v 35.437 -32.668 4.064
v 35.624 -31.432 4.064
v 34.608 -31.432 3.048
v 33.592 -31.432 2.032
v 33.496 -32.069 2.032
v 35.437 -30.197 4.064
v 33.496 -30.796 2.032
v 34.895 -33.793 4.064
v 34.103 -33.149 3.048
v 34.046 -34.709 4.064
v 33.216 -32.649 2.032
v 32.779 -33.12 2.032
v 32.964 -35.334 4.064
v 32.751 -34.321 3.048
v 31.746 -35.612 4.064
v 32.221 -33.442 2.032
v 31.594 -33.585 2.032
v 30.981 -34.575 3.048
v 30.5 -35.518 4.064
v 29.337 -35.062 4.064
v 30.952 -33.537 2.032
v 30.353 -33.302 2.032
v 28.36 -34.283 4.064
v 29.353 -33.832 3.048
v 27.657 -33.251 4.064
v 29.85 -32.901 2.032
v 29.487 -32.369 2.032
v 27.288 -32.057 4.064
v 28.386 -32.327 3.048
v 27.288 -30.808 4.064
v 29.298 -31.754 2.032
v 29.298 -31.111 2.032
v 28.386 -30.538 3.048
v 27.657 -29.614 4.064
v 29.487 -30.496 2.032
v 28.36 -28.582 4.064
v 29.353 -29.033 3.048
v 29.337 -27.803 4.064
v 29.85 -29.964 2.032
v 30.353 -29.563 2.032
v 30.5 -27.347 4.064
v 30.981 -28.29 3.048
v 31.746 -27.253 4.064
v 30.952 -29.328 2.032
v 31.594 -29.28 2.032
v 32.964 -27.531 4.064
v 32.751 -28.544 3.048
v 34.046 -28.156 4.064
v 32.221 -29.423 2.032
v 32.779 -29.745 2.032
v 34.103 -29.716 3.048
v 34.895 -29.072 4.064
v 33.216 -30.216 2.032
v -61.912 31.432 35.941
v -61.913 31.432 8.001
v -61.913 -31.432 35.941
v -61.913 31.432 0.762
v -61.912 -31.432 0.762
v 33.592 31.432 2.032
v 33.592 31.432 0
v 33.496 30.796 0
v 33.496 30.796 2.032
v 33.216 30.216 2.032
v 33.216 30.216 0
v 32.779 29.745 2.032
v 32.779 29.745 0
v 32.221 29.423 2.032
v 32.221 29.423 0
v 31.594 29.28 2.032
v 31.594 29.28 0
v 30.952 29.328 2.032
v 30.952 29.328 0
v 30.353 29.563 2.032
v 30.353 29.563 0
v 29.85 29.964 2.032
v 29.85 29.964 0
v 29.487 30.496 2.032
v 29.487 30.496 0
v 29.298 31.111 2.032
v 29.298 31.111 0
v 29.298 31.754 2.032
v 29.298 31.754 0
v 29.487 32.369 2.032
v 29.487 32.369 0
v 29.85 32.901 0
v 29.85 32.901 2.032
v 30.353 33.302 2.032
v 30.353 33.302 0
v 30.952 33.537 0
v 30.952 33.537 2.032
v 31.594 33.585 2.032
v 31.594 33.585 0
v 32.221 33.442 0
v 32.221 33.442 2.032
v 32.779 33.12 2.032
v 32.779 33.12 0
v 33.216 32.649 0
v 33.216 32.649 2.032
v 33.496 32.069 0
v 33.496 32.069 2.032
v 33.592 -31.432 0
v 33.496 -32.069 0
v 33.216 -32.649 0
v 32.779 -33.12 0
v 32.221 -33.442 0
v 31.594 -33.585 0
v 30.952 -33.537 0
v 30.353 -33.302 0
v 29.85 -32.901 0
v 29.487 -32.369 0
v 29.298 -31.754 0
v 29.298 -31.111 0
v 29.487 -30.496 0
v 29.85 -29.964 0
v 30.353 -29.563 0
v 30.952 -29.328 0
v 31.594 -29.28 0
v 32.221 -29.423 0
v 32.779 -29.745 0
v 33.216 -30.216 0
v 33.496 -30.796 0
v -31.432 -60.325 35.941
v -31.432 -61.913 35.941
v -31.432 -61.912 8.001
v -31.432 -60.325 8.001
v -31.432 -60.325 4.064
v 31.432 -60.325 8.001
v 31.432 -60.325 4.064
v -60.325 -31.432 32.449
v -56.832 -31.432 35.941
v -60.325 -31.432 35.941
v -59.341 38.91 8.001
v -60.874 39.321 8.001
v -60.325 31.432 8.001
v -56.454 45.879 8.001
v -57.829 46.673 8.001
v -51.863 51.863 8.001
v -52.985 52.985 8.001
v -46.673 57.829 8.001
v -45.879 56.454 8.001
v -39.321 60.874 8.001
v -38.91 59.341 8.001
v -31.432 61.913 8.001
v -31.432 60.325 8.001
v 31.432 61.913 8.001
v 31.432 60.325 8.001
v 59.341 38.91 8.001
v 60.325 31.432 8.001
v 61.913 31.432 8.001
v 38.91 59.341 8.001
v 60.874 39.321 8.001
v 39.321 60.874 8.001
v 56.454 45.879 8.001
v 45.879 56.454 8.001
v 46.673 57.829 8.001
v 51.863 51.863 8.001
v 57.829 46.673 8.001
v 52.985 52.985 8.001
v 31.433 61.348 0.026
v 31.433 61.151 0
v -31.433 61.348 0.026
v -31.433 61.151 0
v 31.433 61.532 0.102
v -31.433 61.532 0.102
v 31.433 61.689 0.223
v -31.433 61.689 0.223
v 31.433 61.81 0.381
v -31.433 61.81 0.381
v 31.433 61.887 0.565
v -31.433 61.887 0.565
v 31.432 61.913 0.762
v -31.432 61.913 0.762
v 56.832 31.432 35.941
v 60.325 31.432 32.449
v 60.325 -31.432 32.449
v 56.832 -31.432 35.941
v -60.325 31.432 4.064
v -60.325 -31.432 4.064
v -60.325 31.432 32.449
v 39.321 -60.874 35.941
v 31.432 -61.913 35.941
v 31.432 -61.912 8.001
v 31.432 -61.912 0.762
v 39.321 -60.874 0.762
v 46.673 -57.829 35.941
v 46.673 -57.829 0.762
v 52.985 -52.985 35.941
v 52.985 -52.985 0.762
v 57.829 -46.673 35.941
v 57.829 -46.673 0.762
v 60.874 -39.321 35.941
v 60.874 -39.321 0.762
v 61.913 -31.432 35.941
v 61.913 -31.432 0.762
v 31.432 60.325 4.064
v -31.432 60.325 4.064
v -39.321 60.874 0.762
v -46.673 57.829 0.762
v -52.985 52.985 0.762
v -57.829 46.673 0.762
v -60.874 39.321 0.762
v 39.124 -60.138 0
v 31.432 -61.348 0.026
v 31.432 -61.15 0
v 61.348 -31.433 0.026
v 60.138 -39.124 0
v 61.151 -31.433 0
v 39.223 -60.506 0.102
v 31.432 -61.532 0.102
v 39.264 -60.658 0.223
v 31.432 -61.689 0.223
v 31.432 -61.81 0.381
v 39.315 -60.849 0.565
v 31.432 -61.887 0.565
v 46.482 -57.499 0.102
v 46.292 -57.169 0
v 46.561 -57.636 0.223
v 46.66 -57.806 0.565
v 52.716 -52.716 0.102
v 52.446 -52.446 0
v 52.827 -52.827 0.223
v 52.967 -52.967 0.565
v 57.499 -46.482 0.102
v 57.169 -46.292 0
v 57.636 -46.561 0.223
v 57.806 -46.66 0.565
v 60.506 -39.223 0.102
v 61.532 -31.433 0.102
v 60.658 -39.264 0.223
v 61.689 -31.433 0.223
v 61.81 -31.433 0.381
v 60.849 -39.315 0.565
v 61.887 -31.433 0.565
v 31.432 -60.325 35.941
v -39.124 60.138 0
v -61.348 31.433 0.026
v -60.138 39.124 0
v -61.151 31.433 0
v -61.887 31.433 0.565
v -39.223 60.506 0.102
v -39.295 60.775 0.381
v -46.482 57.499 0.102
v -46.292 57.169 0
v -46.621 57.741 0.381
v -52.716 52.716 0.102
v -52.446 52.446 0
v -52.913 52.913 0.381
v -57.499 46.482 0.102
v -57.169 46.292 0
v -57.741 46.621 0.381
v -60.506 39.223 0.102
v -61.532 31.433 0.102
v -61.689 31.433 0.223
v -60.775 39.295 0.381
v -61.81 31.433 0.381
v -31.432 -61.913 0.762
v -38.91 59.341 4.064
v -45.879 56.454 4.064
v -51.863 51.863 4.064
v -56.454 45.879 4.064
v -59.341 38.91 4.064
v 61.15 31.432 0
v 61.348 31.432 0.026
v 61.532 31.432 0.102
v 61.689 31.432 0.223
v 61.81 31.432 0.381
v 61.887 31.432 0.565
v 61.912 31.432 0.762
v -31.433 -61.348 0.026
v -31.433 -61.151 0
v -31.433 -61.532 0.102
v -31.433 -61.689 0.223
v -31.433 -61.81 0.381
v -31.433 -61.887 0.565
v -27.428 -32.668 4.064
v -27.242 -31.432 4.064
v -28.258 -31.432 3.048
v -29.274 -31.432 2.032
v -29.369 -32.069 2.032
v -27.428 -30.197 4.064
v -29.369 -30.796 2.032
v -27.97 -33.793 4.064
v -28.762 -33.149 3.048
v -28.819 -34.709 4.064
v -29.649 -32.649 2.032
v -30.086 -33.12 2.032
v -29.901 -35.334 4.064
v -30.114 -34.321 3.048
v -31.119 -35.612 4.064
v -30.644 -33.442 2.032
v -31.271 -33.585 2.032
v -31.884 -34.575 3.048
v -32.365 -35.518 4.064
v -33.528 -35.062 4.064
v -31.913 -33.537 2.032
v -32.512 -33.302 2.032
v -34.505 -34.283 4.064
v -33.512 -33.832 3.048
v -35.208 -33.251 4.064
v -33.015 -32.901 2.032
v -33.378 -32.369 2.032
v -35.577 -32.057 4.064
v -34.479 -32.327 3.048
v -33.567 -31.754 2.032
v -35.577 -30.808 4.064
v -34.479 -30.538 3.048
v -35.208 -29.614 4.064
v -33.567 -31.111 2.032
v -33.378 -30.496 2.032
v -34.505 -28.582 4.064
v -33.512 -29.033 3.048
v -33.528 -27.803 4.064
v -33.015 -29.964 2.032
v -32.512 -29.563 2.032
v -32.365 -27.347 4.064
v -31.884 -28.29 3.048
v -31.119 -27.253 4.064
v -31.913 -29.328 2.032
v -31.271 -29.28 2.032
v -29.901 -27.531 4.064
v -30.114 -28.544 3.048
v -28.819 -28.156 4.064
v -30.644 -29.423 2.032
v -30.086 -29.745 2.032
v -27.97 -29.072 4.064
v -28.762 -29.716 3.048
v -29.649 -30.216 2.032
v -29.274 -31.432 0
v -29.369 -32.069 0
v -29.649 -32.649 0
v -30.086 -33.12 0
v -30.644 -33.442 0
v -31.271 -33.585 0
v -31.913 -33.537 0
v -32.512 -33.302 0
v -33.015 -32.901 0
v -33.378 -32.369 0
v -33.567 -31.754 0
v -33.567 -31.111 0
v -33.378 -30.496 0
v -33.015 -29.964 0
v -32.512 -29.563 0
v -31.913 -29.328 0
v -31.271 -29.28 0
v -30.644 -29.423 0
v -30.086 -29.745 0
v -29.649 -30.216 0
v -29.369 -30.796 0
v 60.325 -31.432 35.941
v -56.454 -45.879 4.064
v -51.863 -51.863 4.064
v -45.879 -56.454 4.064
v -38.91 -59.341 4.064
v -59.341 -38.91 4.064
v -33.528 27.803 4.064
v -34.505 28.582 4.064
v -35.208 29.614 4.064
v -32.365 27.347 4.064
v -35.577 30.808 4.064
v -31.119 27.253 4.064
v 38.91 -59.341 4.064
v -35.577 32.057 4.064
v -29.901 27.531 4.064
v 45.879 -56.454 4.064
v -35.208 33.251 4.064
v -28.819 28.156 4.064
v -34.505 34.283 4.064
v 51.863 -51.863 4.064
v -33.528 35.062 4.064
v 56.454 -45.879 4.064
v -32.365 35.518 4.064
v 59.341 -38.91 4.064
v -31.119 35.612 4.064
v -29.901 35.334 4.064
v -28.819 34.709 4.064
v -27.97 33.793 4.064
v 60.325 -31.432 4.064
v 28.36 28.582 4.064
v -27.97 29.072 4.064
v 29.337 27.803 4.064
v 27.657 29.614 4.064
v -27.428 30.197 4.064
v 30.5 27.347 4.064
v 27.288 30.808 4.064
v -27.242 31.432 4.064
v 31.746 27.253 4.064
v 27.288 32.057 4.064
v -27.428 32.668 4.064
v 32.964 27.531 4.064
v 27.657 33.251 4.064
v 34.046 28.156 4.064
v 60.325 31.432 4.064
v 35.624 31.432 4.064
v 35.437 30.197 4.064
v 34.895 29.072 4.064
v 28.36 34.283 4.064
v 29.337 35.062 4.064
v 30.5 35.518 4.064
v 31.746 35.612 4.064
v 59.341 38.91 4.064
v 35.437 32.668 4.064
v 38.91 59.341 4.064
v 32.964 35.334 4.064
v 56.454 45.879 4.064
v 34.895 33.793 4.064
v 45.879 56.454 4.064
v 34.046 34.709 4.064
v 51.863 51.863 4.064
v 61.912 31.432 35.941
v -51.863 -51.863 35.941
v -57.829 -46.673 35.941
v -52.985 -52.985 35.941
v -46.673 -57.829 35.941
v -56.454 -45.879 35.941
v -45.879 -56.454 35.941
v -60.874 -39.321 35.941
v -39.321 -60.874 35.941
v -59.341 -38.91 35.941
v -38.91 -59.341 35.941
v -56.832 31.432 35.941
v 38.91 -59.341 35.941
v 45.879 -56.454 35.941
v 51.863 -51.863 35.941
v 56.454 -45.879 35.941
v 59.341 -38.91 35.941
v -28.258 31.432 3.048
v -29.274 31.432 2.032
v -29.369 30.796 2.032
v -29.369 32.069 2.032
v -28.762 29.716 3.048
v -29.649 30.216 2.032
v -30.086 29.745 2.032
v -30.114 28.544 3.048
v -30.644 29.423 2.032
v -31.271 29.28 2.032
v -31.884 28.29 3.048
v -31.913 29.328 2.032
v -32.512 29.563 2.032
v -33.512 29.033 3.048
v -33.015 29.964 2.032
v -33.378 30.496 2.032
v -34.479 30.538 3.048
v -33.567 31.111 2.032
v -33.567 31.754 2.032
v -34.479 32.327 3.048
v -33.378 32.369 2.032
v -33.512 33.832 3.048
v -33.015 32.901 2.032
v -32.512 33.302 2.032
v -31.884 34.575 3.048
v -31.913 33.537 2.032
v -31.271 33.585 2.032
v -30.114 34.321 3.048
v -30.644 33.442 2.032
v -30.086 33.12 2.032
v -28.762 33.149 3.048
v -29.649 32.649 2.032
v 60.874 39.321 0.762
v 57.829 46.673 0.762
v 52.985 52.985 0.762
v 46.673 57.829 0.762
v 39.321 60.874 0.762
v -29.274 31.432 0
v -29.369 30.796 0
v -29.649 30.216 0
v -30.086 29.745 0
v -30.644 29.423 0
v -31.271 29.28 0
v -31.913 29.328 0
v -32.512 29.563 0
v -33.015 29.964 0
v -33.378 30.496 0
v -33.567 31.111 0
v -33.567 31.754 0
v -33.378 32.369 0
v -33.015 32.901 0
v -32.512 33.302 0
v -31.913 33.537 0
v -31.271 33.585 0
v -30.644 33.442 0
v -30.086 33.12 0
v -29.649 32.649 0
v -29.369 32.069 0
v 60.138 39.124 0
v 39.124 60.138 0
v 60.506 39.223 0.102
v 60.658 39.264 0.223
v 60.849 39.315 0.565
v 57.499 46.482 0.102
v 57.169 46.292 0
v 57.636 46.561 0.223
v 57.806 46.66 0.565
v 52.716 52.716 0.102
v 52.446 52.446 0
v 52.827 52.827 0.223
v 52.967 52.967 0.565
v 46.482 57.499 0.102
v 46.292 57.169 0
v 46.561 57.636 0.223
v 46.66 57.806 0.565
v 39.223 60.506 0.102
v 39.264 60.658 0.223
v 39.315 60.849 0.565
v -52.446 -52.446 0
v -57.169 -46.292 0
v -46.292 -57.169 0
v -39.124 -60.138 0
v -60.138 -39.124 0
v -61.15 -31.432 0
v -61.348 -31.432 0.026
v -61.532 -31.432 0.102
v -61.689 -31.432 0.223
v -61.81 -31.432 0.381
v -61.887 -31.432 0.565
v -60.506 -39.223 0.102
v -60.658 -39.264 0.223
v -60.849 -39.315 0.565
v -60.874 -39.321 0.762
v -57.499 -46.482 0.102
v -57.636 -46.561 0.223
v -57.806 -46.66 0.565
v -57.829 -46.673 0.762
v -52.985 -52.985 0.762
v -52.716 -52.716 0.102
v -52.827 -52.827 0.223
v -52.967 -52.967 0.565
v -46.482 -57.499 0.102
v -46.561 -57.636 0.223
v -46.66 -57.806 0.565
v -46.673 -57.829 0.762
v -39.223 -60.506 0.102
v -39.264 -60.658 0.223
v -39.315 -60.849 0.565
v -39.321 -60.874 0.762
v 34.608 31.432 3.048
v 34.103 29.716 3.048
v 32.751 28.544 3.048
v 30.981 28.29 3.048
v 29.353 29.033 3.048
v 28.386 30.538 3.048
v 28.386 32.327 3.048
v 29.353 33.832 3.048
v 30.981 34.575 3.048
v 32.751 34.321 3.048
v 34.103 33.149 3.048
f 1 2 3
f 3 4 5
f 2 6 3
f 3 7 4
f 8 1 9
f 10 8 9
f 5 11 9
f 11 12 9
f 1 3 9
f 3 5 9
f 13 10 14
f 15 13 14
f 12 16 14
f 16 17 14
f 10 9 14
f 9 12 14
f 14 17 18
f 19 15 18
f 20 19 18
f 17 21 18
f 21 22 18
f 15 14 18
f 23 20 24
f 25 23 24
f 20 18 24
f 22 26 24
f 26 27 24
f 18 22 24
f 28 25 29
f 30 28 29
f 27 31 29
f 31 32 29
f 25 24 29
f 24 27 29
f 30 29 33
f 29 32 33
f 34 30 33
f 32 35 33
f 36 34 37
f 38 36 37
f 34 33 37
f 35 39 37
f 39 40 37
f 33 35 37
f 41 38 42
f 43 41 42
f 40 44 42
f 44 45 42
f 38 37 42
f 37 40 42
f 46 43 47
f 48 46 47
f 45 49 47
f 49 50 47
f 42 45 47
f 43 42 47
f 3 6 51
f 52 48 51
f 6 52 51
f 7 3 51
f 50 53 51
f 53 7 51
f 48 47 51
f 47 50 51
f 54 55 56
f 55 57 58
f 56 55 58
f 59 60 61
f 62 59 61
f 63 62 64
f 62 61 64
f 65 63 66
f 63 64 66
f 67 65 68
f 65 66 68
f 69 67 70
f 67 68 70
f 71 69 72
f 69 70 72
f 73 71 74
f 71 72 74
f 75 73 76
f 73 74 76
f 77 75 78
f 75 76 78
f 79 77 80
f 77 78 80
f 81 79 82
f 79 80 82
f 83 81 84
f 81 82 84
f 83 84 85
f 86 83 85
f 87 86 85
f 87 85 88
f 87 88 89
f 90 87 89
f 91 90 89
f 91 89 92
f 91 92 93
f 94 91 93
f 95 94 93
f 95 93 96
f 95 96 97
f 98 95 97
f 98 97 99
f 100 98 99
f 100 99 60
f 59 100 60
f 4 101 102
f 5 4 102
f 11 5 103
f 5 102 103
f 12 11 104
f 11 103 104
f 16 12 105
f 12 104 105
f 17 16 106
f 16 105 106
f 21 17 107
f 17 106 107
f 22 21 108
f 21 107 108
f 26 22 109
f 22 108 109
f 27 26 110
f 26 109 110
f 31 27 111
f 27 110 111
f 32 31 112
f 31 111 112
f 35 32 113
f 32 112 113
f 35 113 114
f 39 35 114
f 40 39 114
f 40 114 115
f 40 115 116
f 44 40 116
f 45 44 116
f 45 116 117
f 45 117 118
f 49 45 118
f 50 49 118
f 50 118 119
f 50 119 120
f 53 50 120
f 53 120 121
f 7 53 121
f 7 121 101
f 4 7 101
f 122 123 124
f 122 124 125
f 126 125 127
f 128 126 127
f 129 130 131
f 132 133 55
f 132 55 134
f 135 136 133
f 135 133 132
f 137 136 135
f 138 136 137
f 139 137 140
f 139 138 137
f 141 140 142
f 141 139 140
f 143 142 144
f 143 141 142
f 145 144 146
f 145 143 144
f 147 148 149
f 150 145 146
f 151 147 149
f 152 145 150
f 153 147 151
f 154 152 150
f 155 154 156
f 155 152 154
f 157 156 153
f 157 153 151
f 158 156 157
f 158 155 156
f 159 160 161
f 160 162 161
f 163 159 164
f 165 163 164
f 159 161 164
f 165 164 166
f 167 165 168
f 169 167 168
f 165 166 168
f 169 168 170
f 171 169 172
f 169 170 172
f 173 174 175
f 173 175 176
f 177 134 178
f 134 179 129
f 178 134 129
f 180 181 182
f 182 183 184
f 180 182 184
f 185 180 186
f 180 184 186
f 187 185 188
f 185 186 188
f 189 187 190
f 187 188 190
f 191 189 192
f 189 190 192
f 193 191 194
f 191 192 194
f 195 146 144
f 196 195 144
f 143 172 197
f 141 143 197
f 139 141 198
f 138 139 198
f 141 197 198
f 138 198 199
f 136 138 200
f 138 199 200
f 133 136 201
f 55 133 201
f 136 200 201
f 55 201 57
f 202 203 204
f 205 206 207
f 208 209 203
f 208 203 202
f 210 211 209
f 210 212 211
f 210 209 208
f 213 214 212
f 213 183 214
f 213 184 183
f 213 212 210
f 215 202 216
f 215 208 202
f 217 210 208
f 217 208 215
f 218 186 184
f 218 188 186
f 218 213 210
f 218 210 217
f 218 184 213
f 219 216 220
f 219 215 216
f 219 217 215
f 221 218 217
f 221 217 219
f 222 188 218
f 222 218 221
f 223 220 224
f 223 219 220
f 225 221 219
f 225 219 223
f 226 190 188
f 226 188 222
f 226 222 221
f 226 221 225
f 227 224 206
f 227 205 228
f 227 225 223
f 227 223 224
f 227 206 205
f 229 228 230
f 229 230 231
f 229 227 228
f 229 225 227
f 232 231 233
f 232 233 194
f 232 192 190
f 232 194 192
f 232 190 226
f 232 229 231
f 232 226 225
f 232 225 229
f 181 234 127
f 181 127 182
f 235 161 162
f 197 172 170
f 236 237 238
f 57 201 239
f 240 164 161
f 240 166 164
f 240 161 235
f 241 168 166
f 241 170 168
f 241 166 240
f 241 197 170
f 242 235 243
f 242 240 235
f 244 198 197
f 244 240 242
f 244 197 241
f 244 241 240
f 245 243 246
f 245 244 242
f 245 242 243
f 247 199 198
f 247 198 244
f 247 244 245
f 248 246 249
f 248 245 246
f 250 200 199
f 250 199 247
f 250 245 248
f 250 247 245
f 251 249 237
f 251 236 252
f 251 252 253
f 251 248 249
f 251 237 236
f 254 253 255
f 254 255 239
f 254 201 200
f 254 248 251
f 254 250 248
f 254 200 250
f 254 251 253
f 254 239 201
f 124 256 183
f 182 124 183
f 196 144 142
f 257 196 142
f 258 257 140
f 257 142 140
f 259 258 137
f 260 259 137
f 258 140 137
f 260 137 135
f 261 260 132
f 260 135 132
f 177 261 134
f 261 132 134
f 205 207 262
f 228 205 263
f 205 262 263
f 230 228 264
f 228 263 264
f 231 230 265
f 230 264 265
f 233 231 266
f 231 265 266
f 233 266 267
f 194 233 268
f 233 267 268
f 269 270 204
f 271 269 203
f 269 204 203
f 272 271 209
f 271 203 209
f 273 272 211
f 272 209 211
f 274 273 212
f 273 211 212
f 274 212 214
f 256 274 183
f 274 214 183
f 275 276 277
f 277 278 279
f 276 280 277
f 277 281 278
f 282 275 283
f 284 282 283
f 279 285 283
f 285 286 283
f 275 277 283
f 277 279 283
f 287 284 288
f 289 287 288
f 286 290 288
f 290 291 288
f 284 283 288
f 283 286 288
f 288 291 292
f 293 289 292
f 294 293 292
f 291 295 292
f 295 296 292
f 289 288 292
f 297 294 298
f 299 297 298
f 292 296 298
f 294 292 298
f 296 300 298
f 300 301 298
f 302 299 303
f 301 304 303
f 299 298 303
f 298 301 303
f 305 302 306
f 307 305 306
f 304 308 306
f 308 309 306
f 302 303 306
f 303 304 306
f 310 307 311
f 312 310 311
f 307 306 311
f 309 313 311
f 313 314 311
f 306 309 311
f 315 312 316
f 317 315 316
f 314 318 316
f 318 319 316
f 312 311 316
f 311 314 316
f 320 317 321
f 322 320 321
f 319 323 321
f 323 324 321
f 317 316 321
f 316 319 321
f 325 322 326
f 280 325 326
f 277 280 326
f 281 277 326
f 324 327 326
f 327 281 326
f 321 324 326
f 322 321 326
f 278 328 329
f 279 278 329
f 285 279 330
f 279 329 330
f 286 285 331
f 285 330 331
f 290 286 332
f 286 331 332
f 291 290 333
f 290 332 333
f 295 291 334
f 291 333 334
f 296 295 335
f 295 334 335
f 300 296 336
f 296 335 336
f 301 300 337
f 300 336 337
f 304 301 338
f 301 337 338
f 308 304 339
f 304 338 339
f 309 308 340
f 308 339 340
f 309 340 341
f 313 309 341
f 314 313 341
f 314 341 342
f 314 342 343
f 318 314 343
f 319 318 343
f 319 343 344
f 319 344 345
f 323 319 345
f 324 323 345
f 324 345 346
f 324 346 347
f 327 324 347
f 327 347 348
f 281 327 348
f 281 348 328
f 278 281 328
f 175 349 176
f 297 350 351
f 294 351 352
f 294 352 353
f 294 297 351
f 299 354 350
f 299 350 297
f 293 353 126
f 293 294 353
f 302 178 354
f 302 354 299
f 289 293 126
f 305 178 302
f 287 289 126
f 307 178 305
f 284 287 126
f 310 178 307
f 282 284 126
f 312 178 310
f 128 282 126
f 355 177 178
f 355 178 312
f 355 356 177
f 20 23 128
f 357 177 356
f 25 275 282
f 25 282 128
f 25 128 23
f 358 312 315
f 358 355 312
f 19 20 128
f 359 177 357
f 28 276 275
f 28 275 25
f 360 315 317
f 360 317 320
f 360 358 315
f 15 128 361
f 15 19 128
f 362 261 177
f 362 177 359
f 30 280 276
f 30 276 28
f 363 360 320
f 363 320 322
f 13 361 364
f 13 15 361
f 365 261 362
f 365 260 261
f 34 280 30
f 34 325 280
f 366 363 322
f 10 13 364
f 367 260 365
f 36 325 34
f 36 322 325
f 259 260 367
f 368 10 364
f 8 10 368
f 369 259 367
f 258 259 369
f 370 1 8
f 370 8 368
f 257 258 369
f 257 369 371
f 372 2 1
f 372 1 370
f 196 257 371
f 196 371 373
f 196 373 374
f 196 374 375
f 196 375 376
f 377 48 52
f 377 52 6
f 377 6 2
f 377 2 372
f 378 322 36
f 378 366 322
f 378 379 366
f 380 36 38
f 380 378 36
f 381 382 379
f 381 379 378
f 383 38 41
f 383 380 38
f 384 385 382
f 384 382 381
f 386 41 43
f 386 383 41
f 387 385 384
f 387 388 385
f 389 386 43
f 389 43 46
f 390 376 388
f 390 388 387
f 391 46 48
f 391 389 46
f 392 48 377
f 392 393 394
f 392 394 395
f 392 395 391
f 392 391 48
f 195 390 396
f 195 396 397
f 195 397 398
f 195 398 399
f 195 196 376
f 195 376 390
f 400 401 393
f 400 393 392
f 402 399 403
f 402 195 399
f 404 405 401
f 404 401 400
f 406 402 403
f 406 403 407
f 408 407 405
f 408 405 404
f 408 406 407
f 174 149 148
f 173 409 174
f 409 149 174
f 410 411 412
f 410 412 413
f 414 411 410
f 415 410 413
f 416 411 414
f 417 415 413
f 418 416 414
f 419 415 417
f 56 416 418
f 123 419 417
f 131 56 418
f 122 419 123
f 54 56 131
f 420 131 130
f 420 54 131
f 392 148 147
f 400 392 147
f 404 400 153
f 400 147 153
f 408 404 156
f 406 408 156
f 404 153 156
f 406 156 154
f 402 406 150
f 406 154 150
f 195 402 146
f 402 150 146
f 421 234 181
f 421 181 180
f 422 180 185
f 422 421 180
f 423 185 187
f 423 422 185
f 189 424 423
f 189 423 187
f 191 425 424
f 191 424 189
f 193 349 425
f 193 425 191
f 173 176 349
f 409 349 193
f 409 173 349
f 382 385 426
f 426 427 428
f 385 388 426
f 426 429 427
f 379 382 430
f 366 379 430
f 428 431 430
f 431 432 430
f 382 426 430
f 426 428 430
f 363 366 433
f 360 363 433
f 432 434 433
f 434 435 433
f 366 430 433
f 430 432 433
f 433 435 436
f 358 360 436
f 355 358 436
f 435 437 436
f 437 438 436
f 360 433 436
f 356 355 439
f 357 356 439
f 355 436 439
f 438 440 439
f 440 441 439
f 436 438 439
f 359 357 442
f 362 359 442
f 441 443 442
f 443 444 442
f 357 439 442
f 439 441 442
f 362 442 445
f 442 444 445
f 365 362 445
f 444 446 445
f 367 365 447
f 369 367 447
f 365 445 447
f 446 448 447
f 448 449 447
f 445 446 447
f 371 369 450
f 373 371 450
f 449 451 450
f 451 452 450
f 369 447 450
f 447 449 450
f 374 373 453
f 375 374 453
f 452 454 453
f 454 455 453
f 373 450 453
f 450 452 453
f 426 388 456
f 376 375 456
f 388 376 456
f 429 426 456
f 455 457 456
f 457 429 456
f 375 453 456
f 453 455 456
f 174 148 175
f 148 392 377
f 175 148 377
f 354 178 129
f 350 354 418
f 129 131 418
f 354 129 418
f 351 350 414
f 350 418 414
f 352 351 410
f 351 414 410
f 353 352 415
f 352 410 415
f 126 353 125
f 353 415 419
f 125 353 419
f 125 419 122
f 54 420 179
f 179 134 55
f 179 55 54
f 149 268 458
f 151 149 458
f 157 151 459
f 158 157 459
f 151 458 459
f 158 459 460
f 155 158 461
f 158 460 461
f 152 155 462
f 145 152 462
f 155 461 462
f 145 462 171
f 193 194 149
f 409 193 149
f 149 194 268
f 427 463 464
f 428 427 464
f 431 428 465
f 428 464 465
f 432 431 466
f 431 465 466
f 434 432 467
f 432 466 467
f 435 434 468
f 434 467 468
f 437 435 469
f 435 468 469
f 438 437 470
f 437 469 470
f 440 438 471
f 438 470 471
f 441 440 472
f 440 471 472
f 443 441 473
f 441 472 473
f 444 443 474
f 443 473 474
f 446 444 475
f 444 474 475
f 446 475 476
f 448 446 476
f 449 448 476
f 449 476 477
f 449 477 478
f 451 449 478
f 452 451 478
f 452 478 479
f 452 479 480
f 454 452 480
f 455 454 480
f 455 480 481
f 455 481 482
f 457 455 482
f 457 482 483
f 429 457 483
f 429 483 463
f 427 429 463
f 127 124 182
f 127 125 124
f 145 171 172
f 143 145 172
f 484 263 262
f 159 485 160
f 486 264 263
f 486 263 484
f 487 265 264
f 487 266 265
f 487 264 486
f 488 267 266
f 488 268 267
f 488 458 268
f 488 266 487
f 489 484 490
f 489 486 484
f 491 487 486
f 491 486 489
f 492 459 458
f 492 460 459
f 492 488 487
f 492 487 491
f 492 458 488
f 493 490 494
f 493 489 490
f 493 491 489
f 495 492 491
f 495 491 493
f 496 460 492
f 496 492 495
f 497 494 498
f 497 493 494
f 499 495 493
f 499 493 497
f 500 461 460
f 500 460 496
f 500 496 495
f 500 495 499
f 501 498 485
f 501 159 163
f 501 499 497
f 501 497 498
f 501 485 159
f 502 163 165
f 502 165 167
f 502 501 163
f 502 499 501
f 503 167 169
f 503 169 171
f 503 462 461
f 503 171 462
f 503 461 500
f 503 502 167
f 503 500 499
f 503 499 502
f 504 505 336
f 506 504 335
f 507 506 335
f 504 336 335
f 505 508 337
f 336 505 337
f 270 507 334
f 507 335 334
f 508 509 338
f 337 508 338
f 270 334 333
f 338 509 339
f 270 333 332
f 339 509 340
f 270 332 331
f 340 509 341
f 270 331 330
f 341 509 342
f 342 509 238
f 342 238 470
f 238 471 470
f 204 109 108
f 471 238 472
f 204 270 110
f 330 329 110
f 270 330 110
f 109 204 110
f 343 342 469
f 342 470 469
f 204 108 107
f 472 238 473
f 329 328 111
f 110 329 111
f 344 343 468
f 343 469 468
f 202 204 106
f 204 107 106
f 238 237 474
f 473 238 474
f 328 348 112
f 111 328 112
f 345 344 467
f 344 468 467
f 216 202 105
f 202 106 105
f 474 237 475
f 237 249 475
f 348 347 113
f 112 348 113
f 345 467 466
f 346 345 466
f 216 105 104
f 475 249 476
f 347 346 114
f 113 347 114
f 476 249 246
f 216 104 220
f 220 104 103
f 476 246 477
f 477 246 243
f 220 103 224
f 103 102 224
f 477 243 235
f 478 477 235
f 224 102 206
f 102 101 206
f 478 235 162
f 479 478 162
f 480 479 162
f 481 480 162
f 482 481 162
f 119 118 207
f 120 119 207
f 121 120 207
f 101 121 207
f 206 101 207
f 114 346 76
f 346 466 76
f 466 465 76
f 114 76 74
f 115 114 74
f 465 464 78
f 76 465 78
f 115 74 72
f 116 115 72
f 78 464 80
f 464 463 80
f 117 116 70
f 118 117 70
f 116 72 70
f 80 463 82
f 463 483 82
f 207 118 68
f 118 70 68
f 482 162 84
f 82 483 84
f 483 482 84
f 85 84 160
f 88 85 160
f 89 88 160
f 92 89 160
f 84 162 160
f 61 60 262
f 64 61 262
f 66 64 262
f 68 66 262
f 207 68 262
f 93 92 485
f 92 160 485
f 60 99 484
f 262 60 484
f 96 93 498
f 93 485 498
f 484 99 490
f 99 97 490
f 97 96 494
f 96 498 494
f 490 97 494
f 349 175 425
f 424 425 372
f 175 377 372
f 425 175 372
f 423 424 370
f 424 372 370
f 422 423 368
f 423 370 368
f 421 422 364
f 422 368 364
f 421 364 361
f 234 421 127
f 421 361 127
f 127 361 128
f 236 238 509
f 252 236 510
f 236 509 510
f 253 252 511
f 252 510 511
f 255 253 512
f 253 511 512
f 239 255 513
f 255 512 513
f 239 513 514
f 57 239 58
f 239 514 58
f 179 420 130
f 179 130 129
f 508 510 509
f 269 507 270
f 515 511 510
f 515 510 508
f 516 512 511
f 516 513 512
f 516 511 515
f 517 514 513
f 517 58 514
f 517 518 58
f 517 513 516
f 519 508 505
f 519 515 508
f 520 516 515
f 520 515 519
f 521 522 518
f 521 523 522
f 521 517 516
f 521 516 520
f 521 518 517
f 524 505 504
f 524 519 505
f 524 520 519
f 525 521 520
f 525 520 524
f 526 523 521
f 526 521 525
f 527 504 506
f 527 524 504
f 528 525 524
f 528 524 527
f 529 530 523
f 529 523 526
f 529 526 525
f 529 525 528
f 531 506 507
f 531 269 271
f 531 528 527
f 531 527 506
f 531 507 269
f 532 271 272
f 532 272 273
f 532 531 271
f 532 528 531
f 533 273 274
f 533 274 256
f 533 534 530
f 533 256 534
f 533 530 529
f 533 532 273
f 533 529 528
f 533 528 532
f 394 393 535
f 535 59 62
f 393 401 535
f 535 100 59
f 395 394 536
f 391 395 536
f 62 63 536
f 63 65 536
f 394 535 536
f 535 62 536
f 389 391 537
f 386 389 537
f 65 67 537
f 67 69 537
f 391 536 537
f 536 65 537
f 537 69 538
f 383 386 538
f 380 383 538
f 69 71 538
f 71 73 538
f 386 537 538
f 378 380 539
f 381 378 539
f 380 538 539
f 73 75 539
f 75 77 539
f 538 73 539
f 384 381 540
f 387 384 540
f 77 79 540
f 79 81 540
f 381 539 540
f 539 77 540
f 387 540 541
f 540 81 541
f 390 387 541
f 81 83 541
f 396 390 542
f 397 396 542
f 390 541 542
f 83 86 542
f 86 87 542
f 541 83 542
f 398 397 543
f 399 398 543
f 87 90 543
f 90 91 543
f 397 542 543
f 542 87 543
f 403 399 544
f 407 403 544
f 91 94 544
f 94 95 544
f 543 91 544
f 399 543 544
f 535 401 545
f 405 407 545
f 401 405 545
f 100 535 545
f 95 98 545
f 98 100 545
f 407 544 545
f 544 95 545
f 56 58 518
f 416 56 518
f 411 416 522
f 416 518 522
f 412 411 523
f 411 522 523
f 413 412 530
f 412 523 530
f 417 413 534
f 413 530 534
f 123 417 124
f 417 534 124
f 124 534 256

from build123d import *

# Parameters (mm, degrees)
F1_DEPTH = 8.001
F3_DEPTH = 3.937
F5_DEPTH = 27.94
F7_DEPTH = 62.865
F8_R     = 2.159
F9_DEPTH = 25.4
F10_SIZE = 2.032
F11_R    = 0.762


with BuildPart() as f1:
    # F0 (on Top) → F1 (new body)
    with BuildSketch(Plane.XY):
        with BuildLine():
            Line((31.4325, 61.9125), (-31.4325, 61.9125))
            ThreePointArc((-31.4325, 61.9125), (-52.9851146906, 52.9851146906), (-61.9125, 31.4325))
            Line((-61.9125, 31.4325), (-61.9125, -31.4325))
            ThreePointArc((-61.9125, -31.4325), (-52.9851146906, -52.9851146906), (-31.4325, -61.9125))
            Line((-31.4325, -61.9125), (31.4325, -61.9125))
            ThreePointArc((31.4325, -61.9125), (52.9851146906, -52.9851146906), (61.9125, -31.4325))
            Line((61.9125, -31.4325), (61.9125, 31.4325))
            ThreePointArc((61.9125, 31.4325), (52.9851146906, 52.9851146906), (31.4325, 61.9125))
        make_face()
    extrude(amount=F1_DEPTH)

    # F2 (on face) → F3 (cut)
    with BuildSketch(Plane.XY.offset(8.001)):
        with BuildLine():
            Line((31.4325, 60.325), (-31.4325, 60.325))
            ThreePointArc((-31.4325, 60.325), (-51.8625826754, 51.8625826754), (-60.325, 31.4325))
            Line((-60.325, 31.4325), (-60.325, -31.4325))
            ThreePointArc((-60.325, -31.4325), (-51.8625826754, -51.8625826754), (-31.4325, -60.325))
            Line((-31.4325, -60.325), (31.4325, -60.325))
            ThreePointArc((31.4325, -60.325), (51.8625826754, -51.8625826754), (60.325, -31.4325))
            Line((60.325, -31.4325), (60.325, 31.4325))
            ThreePointArc((60.325, 31.4325), (51.8625826754, 51.8625826754), (31.4325, 60.325))
        make_face()
    extrude(amount=-F3_DEPTH, mode=Mode.SUBTRACT)

    # F4 (on face) → F5 (join)
    with BuildSketch(Plane.XY.offset(8.001)):
        with BuildLine():
            Line((61.9125, 31.4325), (60.325, 31.4325))
            Line((60.325, 31.4325), (60.325, -31.4325))
            ThreePointArc((60.325, -31.4325), (51.8625826754, -51.8625826754), (31.4325, -60.325))
            Line((31.4325, -60.325), (31.4325, -61.9125))
            ThreePointArc((31.4325, -61.9125), (52.9851146906, -52.9851146906), (61.9125, -31.4325))
            Line((61.9125, -31.4325), (61.9125, 31.4325))
        make_face()
        with BuildLine():
            Line((-60.325, -31.4325), (-60.325, 31.4325))
            Line((-60.325, 31.4325), (-61.9125, 31.4325))
            Line((-61.9125, 31.4325), (-61.9125, -31.4325))
            ThreePointArc((-61.9125, -31.4325), (-52.9851146906, -52.9851146906), (-31.4325, -61.9125))
            Line((-31.4325, -61.9125), (-31.4325, -60.325))
            ThreePointArc((-31.4325, -60.325), (-51.8625826754, -51.8625826754), (-60.325, -31.4325))
        make_face()
    extrude(amount=F5_DEPTH)

    # F6 (on face) → F7 (join, through all)
    with BuildSketch(Plane(origin=(0, 31.4325, 0), x_dir=(-1, 0, 0), z_dir=(0, 1, 0))):
        Polygon((-56.8325, 35.941), (-60.325, 35.941), (-60.325, 32.4485), align=None)
        Polygon((60.325, 32.4485), (60.325, 35.941), (56.8325, 35.941), align=None)
    extrude(amount=-F7_DEPTH)

    # F8 (on face) → F9 (cut)
    with BuildSketch(Plane(origin=(0, 0, 0), x_dir=(1, 0, 0), z_dir=(0, 0, -1))):
        with Locations((-31.4325, 31.4325)):
            Circle(F8_R)
        with Locations((31.4325, 31.4325)):
            Circle(F8_R)
        with Locations((31.4325, -31.4325)):
            Circle(F8_R)
        with Locations((-31.4325, -31.4325)):
            Circle(F8_R)
    extrude(amount=-F9_DEPTH, mode=Mode.SUBTRACT)

    # F10
    f10_edges = [f1.edges().sort_by_distance(p)[0] for p in [
        (29.2735, -31.4325, 4.064),
        (-33.5915, -31.4325, 4.064),
        (-33.5915, 31.4325, 4.064),
        (29.2735, 31.4325, 4.064),
    ]]
    chamfer(f10_edges, length=F10_SIZE)

    # F11
    f11_edges = [f1.edges().sort_by_distance(p)[0] for p in [
        (-52.985115, 52.985115, 0),
    ]]
    fillet(f11_edges, radius=F11_R)


solid = f1.part
